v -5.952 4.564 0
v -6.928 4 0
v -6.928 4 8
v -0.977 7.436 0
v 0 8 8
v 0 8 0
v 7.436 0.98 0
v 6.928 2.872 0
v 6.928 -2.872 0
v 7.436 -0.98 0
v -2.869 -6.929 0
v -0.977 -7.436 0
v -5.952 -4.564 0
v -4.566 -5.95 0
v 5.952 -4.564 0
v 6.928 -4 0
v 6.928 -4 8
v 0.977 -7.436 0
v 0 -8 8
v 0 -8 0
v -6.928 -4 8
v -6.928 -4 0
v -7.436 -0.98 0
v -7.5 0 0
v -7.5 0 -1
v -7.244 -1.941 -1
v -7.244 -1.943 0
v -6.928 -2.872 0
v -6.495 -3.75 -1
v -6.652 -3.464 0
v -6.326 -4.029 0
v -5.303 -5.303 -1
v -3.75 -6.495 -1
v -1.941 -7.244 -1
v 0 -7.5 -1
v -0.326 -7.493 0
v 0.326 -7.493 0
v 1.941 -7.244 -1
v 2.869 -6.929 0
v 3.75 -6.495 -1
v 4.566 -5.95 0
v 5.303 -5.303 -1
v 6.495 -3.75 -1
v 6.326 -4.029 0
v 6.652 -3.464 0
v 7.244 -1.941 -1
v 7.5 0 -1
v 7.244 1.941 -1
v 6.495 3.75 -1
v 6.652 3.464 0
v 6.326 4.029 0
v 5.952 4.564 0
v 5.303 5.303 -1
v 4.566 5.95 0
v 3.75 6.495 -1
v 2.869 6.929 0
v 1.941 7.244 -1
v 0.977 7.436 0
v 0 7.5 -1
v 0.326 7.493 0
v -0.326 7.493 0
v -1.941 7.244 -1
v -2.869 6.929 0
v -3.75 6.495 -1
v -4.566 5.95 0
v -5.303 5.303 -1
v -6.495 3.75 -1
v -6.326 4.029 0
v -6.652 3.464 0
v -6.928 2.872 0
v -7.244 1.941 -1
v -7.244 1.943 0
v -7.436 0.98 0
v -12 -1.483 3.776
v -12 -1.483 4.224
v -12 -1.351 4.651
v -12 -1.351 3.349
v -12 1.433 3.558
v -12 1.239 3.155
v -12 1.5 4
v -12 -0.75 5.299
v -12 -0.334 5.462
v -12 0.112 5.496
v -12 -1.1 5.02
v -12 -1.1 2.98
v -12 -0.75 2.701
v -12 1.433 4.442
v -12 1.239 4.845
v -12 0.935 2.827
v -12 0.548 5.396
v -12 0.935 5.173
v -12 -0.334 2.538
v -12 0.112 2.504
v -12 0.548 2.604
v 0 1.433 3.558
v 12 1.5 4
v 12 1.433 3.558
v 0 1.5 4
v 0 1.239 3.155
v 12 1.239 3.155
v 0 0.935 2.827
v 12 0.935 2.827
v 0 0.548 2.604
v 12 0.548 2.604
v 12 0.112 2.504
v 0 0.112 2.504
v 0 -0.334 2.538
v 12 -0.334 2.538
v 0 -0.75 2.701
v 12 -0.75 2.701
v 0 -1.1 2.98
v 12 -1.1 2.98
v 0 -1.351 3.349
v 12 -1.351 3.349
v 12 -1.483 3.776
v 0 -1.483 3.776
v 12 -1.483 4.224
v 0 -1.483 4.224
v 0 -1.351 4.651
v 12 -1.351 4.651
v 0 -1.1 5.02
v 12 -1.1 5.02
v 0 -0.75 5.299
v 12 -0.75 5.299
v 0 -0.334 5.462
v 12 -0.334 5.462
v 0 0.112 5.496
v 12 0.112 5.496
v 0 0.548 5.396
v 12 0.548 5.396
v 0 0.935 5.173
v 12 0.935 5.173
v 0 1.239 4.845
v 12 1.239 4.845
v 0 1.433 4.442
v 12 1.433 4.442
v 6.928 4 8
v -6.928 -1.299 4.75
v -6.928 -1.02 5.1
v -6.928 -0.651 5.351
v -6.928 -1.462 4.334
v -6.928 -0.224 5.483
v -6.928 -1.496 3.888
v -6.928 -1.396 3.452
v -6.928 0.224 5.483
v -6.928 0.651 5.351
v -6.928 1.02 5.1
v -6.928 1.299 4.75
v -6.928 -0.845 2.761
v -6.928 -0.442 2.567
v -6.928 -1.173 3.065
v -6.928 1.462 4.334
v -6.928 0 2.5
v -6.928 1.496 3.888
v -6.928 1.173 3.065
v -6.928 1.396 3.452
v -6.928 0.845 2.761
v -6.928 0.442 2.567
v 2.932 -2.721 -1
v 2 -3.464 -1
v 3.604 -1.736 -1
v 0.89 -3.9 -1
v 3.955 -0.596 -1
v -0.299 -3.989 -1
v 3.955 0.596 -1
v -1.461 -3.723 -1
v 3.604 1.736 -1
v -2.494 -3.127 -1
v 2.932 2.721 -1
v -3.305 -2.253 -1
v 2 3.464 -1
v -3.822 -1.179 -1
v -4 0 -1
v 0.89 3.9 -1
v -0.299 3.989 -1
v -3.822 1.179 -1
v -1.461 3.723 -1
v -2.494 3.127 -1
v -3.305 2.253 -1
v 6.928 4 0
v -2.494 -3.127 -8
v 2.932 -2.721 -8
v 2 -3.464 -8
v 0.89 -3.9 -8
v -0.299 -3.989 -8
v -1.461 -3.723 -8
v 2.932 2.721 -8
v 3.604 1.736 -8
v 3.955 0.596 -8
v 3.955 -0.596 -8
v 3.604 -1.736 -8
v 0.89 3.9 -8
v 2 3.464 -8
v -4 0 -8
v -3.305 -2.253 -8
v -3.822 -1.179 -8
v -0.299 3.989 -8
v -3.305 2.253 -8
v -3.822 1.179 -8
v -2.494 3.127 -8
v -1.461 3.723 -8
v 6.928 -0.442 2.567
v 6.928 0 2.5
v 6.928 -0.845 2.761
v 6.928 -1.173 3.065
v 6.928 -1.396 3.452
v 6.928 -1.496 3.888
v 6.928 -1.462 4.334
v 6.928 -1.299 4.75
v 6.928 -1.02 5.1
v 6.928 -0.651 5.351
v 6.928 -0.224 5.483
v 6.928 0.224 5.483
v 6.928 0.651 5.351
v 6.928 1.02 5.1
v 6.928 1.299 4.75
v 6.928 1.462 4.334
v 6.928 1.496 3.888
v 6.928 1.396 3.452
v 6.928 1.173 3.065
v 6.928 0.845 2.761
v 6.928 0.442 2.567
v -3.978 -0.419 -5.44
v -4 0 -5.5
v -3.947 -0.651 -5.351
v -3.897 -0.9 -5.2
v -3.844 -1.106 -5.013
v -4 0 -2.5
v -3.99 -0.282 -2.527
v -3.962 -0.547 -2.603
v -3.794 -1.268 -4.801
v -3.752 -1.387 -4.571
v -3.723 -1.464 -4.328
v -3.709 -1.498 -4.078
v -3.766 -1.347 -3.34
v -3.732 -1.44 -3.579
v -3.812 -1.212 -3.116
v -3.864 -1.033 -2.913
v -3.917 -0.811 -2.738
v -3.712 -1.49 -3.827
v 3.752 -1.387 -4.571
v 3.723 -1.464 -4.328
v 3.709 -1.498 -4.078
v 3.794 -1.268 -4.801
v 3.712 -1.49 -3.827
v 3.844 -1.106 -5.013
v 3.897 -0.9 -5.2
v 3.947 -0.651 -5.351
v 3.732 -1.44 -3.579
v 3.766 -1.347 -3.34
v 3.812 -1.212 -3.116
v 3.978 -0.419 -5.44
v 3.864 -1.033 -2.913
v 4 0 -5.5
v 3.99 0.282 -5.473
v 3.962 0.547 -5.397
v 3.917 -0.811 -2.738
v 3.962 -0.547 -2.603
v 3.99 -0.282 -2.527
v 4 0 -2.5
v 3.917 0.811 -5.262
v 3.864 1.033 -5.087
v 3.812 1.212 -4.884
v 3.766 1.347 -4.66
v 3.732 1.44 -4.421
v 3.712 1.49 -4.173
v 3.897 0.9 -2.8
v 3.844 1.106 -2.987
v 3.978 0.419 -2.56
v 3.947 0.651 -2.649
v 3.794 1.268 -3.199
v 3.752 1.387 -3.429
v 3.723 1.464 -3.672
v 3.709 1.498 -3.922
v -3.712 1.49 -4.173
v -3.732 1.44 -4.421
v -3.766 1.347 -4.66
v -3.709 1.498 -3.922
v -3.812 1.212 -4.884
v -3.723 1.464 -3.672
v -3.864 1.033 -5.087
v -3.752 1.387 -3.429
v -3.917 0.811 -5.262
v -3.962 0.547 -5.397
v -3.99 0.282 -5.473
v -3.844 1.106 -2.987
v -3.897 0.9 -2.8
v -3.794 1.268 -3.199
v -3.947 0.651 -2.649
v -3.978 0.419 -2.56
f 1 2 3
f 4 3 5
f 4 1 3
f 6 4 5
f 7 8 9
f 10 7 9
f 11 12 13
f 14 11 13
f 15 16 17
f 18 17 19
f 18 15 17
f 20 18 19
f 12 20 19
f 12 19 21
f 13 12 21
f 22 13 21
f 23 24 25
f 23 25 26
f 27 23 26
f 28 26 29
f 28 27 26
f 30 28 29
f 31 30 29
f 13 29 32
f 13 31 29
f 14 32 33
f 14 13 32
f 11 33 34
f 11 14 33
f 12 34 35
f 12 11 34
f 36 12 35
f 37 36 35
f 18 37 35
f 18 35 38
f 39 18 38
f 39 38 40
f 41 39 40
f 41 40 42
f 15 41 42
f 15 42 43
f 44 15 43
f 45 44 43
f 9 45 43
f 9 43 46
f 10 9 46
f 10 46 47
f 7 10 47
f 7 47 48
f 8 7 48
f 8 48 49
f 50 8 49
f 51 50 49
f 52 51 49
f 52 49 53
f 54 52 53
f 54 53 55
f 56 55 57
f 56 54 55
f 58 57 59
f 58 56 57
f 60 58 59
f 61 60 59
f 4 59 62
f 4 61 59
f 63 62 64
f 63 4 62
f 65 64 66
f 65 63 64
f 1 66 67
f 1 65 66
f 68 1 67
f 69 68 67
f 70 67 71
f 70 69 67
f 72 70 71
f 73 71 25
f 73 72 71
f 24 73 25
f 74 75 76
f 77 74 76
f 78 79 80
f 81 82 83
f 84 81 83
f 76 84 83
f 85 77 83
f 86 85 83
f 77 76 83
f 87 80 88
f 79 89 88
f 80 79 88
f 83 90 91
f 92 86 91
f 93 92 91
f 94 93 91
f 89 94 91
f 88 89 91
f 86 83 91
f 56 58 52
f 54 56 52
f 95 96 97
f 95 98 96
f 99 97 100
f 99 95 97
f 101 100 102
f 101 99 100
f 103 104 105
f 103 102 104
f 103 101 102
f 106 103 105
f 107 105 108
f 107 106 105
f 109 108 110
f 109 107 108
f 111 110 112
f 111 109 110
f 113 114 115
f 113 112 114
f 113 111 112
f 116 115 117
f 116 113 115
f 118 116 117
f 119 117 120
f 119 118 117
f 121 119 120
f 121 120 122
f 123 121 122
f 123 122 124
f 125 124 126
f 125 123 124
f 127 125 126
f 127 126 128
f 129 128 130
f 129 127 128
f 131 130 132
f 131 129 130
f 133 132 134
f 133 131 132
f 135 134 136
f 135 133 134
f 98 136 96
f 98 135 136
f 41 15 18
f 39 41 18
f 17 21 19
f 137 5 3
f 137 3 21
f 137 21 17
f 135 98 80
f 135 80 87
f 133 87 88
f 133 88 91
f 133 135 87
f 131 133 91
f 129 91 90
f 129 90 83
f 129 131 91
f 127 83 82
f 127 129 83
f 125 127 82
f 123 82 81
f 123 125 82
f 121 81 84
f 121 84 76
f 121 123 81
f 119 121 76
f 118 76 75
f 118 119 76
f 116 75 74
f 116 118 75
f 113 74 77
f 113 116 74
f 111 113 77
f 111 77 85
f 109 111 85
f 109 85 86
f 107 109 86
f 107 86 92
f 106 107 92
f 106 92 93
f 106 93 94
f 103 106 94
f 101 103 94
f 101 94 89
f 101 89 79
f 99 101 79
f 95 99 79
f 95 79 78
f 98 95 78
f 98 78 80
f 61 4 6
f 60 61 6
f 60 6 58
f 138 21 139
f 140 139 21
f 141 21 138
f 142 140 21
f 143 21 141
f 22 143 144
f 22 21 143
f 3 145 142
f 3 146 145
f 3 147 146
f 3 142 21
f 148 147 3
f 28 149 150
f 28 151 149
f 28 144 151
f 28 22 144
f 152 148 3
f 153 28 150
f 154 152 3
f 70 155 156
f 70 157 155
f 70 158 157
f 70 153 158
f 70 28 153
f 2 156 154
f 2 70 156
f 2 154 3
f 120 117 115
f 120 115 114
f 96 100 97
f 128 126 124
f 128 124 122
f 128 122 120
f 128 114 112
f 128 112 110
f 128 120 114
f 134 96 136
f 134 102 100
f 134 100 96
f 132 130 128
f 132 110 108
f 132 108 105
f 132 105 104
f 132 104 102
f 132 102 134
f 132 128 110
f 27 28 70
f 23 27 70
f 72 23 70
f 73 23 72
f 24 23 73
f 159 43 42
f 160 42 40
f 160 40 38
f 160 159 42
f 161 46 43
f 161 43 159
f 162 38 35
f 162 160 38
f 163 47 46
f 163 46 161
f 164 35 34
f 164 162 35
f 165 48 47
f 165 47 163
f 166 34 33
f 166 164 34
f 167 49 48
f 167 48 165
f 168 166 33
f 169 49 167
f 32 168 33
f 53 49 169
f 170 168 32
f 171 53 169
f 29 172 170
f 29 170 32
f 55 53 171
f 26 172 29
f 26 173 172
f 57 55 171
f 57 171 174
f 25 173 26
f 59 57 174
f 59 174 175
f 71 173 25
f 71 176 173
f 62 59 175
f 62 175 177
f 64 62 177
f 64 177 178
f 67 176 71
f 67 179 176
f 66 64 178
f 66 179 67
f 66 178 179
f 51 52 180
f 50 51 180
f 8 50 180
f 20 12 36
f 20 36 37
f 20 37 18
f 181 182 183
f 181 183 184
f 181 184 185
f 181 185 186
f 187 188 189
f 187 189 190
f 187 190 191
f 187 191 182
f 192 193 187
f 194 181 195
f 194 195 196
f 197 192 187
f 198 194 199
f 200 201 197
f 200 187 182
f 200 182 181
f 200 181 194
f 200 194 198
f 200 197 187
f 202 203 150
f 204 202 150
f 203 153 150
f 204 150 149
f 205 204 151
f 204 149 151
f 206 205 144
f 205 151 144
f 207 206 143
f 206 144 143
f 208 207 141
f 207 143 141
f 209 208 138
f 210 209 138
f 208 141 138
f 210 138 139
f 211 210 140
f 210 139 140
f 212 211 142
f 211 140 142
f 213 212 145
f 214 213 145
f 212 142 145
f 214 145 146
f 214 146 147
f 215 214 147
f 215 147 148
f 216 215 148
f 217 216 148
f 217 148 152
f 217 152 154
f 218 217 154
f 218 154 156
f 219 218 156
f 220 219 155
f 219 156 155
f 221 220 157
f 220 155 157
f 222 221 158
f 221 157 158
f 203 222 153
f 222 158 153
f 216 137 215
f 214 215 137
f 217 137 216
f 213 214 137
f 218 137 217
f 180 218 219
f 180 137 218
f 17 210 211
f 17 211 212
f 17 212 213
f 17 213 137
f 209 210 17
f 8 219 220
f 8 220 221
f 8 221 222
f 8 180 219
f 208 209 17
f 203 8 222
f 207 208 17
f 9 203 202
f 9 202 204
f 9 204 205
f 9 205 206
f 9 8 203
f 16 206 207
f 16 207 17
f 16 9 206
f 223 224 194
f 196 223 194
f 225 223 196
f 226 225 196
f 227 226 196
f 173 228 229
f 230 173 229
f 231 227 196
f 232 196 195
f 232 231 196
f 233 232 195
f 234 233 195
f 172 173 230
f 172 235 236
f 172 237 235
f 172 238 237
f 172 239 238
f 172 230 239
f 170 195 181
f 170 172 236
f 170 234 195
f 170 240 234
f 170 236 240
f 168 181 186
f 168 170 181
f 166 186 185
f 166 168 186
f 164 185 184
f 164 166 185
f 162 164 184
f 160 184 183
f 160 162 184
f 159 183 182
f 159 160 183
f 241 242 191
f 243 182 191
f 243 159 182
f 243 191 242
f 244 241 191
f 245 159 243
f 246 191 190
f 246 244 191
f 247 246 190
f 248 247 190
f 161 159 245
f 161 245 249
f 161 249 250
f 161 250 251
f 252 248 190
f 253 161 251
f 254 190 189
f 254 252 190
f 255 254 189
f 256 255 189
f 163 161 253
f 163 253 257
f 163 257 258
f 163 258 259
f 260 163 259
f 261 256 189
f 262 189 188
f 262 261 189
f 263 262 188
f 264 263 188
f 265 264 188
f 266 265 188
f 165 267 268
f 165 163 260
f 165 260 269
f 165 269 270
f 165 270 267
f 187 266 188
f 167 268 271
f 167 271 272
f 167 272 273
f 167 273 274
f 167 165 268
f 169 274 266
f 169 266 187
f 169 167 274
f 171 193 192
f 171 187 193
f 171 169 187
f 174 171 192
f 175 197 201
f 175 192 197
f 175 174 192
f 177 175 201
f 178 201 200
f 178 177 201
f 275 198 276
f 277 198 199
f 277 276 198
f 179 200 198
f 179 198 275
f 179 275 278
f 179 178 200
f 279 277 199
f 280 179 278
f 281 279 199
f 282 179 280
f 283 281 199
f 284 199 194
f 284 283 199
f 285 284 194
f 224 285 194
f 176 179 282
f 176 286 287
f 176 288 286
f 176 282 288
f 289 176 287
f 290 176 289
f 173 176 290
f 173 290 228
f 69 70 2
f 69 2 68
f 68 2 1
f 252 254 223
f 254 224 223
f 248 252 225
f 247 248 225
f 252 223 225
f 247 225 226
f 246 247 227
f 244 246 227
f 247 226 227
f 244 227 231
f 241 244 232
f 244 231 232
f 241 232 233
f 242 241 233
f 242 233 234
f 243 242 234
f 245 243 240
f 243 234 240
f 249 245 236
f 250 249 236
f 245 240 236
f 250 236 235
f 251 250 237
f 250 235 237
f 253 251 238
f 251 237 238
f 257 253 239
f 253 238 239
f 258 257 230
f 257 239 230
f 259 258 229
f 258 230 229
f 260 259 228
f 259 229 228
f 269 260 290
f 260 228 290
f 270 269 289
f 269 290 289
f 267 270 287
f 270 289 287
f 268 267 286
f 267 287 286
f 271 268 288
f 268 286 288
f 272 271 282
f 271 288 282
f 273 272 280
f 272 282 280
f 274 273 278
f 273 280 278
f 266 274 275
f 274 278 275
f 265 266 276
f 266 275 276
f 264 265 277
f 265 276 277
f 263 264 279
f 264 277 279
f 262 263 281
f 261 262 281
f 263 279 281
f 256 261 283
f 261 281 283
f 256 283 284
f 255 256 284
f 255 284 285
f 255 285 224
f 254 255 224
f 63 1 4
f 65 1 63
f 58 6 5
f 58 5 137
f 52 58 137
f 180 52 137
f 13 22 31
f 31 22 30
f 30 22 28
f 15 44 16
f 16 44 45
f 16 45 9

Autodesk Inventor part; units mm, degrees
sketch "Sketch1" plane through (0, 0, 0) normal (0, 0, 1) x (1, 0, 0)
  line L0 (0, 8) -> (6.9282, 4)
  line L1 (6.9282, 4) -> (6.9282, -4)
  line L2 (6.9282, -4) -> (0, -8)
  line L3 (0, -8) -> (-6.9282, -4)
  line L4 (-6.9282, -4) -> (-6.9282, 4)
  line L5 (-6.9282, 4) -> (0, 8)
  point P0 (0, 0)
  point P1 (0, 0)
  point P2 (-6.9282, 0)
  dimension "d0" = 16
extrude "Extrusion1" add sketch "Sketch1" along normal blind 8
sketch "Sketch2" plane through (0, 0, 0) normal (0, 0, -1) x (-1, 0, 0)
  circle A0 centre (0, 0) radius 4
  dimension "d3" = 8
extrude "Extrusion2" add sketch "Sketch2" along normal blind 8
sketch "Sketch3" plane through (0, 0, 0) normal (0, 0, -1) x (-1, 0, 0)
  circle A0 centre (0, 0) radius 7.5
  dimension "d6" = 15
extrude "Extrusion3" add sketch "Sketch3" along normal blind 1
thread "Thread1" size "M8x1.25" class "6g" standard "ISO Metric profile" length 9.5
ref_plane "Work Plane1" through (7, 0, 0) normal (1, 0, 0) x (0, 1, 0)
sketch "Sketch4" plane through (7, 0, 0) normal (1, 0, 0) x (0, 1, 0)
  line L0 (-4, 8) -> (4, 8) projected
  line L1 (-2.8723, 0) -> (2.8723, 0) projected
  point P0 (0, 0)
  point P1 (0, 4)
  point P2 (0, 0)
  dimension "d12" = 4
hole "Hole1" at (7, 0, 4) direction (-1, 0, 0) diameter 3 end through all
ref_plane "Work Plane2" through (4, 0, 0) normal (1, 0, 0) x (0, 1, 0)
sketch "Sketch5" plane through (4, 0, 0) normal (1, 0, 0) x (0, 1, 0)
  line L0 (-2.8723, 0) -> (2.8723, 0) projected
  line L1 (-7.5, -1) -> (7.5, -1) projected
  point P0 (0, 0)
  point P1 (0, -4)
  point P2 (0, 0)
  dimension "d21" = 3
hole "Hole2" at (4, 0, -4) direction (-1, 0, 0) diameter 3 end through all
ref_plane "Work Plane3" through (0, 0, 0) normal (1, 0, 0) x (0, 1, 0)
sketch "Sketch6" plane through (0, 0, 0) normal (1, 0, 0) x (0, 1, 0)
  circle A0 centre (0, 4) radius 1.5 projected
  point P0 (0, 0)
extrude "Extrusion4" add sketch "Sketch6" along normal mid plane 24 separate body
properties part number "123 cap"
